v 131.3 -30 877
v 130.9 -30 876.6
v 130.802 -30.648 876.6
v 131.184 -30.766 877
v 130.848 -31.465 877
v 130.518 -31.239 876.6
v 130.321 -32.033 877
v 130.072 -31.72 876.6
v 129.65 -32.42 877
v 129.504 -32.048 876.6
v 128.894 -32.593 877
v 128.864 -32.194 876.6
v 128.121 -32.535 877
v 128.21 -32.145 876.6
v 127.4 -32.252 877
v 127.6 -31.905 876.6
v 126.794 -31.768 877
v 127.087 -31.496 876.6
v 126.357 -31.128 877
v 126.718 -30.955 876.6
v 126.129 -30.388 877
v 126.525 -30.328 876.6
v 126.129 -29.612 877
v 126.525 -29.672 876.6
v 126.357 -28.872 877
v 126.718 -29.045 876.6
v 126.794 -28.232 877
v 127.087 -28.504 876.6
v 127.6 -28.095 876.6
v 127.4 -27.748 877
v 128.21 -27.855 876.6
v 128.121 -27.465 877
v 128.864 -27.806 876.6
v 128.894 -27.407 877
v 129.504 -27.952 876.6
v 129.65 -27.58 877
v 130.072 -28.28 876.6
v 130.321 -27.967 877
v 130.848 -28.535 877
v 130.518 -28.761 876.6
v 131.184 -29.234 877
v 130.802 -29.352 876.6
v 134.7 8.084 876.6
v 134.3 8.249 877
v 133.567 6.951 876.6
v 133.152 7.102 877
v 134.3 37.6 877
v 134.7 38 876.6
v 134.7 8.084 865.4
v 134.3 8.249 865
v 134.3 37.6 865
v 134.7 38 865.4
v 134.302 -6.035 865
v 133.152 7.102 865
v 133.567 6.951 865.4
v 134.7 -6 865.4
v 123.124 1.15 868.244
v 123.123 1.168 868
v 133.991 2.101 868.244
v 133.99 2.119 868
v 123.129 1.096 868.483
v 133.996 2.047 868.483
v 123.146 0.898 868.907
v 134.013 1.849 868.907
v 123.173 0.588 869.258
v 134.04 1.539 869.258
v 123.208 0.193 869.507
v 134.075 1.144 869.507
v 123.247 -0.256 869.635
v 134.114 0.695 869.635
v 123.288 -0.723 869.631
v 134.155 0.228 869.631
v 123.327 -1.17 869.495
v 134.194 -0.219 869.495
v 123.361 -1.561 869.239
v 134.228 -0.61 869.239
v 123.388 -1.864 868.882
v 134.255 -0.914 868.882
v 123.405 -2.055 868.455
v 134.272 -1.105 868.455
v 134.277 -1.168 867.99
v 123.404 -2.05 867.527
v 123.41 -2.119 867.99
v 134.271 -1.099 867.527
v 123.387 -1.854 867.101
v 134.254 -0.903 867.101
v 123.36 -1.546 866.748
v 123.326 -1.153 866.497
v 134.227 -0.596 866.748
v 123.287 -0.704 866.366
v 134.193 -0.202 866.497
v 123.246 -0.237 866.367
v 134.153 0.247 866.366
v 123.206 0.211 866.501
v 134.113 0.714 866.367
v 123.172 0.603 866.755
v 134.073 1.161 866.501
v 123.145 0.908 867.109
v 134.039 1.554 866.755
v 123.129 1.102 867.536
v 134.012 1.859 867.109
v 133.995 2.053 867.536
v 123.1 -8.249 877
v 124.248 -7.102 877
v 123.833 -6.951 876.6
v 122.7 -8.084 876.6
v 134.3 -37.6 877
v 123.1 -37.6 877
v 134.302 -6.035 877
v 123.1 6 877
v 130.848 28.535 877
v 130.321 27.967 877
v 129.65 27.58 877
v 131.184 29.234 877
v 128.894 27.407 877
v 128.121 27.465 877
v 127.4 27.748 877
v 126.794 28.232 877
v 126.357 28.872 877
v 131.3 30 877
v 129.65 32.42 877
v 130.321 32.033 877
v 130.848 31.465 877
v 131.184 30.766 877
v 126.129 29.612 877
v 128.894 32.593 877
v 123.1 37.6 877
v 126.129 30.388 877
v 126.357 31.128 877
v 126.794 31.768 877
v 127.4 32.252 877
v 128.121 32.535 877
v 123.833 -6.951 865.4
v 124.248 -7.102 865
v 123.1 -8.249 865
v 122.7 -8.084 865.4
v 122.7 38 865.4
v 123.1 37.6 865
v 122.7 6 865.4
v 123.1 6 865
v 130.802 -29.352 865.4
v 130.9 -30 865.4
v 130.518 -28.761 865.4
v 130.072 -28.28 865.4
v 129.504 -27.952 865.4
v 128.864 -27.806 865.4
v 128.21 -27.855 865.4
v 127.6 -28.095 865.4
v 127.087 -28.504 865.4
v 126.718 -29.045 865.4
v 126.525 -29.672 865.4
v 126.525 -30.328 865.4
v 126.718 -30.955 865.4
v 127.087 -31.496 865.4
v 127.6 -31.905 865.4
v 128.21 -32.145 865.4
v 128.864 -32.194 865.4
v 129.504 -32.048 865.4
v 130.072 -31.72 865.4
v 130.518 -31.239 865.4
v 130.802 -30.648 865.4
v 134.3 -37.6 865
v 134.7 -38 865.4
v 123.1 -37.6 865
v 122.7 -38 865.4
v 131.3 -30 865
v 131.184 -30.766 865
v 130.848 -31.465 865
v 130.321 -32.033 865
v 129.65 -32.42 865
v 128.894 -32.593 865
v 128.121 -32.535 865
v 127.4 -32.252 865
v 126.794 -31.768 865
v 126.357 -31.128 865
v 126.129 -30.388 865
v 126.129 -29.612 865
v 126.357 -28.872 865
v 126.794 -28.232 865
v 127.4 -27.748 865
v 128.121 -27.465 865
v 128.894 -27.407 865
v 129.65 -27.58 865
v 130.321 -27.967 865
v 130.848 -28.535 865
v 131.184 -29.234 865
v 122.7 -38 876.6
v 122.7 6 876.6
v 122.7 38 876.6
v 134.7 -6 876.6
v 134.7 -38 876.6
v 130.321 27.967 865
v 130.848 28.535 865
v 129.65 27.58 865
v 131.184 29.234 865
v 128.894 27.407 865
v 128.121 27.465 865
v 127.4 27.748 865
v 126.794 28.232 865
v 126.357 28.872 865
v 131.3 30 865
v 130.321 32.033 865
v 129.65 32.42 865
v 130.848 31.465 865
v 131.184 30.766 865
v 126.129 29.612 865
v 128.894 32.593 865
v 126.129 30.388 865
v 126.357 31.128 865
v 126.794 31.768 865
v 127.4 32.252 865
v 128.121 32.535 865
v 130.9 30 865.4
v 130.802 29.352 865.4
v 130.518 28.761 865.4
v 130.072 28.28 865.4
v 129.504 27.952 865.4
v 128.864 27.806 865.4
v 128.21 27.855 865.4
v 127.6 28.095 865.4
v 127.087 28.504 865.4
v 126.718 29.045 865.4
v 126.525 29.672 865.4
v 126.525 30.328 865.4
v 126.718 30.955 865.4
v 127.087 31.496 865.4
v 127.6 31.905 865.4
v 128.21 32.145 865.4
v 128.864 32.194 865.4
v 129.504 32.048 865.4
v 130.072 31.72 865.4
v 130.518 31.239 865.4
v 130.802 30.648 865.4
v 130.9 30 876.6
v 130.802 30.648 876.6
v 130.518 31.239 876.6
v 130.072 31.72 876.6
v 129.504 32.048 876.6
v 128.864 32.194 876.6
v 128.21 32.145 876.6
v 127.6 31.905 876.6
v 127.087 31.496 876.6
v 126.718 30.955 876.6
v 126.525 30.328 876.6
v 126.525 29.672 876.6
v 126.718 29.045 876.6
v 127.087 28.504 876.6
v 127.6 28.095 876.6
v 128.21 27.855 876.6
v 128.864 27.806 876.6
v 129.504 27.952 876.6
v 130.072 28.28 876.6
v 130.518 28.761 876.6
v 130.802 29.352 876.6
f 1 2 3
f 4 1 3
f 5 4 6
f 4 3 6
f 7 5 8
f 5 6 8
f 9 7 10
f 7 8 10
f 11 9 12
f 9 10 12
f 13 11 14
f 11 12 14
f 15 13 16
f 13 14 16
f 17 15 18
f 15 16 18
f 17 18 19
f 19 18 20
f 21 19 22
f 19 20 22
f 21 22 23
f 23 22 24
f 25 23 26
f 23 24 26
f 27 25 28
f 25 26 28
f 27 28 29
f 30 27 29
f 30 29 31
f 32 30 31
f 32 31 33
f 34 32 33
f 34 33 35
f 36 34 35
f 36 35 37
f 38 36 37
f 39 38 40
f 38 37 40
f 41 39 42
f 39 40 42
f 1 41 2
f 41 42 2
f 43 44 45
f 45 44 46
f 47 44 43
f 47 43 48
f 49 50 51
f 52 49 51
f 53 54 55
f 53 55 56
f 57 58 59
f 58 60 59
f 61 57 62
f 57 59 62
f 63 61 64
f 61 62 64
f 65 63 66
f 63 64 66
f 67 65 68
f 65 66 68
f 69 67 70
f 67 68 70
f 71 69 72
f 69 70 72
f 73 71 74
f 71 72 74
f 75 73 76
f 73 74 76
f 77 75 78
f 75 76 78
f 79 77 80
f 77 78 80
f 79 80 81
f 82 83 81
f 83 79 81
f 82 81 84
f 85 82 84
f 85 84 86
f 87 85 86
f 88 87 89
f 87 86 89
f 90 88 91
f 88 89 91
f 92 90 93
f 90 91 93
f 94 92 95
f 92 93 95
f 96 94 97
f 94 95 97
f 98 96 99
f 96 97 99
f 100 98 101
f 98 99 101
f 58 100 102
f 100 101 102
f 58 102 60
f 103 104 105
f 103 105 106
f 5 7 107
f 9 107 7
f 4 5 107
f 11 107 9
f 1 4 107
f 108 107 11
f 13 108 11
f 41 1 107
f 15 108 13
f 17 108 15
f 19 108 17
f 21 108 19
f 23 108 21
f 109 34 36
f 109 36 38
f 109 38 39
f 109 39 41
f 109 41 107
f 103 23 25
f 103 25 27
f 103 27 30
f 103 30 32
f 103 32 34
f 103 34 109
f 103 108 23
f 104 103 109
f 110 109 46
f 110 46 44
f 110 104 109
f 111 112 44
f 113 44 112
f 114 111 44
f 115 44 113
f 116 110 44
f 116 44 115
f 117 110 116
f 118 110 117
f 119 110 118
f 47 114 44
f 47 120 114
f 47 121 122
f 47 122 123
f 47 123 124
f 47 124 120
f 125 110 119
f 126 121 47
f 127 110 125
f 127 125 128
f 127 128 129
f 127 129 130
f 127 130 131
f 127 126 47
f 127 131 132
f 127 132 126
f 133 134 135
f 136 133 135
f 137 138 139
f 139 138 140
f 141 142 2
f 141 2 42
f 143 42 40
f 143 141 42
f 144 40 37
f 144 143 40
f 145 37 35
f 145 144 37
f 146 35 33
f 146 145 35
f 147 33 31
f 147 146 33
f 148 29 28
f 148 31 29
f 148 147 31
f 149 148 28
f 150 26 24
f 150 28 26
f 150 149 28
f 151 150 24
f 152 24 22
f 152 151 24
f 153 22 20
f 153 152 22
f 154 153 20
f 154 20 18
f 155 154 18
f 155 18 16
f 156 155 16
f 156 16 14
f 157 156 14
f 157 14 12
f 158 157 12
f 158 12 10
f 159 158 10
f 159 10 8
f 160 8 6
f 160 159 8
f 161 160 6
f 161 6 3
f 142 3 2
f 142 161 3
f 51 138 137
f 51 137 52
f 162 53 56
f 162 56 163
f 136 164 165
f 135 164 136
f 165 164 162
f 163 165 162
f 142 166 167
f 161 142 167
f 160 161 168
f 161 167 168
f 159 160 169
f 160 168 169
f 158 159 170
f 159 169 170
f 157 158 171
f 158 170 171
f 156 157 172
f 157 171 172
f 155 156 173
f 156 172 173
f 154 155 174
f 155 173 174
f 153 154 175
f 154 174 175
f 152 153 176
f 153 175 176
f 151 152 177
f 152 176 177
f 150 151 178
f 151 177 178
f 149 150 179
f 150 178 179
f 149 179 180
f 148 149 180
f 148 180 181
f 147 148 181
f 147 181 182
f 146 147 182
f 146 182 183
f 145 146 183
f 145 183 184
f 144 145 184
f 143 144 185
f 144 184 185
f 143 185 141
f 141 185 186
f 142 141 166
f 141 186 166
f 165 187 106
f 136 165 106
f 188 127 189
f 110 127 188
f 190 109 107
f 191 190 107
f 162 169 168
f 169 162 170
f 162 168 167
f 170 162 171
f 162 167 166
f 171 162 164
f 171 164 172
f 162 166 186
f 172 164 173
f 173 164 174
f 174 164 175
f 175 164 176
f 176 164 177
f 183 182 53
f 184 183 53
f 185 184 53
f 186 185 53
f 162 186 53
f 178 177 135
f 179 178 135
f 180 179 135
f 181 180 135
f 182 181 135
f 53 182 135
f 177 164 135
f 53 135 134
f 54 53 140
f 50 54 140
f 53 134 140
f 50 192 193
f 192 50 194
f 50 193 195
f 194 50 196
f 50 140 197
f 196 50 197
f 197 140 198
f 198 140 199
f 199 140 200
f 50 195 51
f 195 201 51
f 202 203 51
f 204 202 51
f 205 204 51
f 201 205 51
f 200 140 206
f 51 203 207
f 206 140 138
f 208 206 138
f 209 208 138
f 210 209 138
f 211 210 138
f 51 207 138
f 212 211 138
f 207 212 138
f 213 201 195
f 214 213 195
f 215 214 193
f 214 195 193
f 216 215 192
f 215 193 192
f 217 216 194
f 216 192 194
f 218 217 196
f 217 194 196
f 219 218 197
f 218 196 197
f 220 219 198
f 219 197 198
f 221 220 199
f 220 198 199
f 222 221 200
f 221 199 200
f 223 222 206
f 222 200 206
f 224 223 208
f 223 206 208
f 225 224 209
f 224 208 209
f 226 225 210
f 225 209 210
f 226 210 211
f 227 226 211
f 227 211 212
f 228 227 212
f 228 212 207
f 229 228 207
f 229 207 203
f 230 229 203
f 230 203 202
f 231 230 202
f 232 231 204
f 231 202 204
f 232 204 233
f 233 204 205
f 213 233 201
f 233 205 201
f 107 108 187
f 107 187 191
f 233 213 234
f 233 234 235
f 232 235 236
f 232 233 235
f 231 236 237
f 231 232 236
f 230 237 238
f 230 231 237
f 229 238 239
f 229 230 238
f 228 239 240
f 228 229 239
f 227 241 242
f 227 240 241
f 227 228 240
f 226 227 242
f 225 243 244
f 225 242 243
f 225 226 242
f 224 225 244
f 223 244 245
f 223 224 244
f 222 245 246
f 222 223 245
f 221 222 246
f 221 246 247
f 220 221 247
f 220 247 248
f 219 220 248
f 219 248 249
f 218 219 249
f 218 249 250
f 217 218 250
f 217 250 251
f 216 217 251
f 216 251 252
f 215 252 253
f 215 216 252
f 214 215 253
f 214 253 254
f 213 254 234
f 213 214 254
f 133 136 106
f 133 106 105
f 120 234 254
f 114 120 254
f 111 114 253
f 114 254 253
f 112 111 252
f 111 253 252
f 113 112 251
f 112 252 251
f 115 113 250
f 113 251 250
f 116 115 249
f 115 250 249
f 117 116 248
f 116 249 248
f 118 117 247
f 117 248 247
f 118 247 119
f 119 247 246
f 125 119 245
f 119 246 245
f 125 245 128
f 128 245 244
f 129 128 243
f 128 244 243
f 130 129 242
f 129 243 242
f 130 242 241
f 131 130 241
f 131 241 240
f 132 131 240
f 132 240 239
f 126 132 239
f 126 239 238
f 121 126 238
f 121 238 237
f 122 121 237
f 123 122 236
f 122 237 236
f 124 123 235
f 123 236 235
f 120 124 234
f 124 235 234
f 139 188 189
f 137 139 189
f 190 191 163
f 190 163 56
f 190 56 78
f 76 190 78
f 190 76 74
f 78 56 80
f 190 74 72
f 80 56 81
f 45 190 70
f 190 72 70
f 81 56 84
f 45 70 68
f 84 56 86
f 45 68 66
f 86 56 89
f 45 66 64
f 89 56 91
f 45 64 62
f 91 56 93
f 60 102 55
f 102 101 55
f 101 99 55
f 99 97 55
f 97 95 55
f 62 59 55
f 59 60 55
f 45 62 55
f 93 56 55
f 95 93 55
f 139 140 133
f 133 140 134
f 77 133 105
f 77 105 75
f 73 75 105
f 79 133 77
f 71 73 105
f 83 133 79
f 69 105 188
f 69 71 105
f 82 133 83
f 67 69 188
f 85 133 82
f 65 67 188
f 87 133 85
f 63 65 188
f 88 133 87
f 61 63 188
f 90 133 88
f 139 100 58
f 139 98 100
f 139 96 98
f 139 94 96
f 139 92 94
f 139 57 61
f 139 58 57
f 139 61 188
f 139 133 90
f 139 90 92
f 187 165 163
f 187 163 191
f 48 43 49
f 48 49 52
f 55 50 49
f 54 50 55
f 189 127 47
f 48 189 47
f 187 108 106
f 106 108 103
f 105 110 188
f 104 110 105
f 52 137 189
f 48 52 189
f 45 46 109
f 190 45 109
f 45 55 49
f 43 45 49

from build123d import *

# Parameters (mm, degrees)
SKETCH023_W          = 76
SKETCH023_H          = 12
PAD007_DEPTH         = 12
SKETCH065_R          = 2.2
POCKET021_DEPTH      = 0.001
POCKET021_DEPTH_BACK = 42.001
SKETCH025_R          = 1.65
POCKET022_DEPTH      = 9.290086
POCKET022_DEPTH_BACK = 9.290086
CHAMFER004_SIZE      = 0.4


with BuildPart() as part:
    # Sketch023 → Pad007 (new body)
    with BuildSketch(Plane.YZ):
        with Locations((0, 36)):
            Rectangle(SKETCH023_W, SKETCH023_H)
    extrude(amount=PAD007_DEPTH)

    # Sketch065 → Pocket021 (cut, two sides)
    with BuildSketch(Plane.XY) as pocket021_sk:
        with Locations((6, 30)):
            Circle(SKETCH065_R)
        with Locations((6, -30)):
            Circle(SKETCH065_R)
        Polygon((10.866975, 6.950634), (13, 9.083659), (13, -5.999897), (12, -5.999897), align=None)
        Polygon((0, 5.999897), (-1, 5.999897), (-1, -9.083659), (1.133025, -6.950634), align=None)
    extrude(amount=-POCKET021_DEPTH, mode=Mode.SUBTRACT)
    extrude(pocket021_sk.sketch, amount=POCKET021_DEPTH_BACK, mode=Mode.SUBTRACT)

    # Sketch025 (on DatumPlane) → Pocket022 (cut, two sides)
    with BuildSketch(Plane(origin=(6, 0, 0), x_dir=(-0.087156, 0.996195, 0), z_dir=(0.996195, 0.087156, 0))) as pocket022_sk:
        with Locations((0, 33)):
            Circle(SKETCH025_R)
    extrude(amount=-POCKET022_DEPTH, mode=Mode.SUBTRACT)
    extrude(pocket022_sk.sketch, amount=POCKET022_DEPTH_BACK, mode=Mode.SUBTRACT)

    # Chamfer004
    chamfer004_edges = [part.edges().sort_by_distance(p)[0] for p in [
        (0, -23.041829, 42),
        (0.566512, -7.517146, 42),
        (0.566512, -0.475369, 42),
        (0, 21.999948, 42),
        (6, 38, 42),
        (12, 23.041829, 42),
        (11.433488, 7.517146, 42),
        (11.433488, 0.475369, 42),
        (12, -21.999948, 42),
        (6, -38, 42),
        (3.8, -30, 42),
        (3.8, 30, 42),
        (0, -23.041829, 30),
        (0.566512, -7.517146, 30),
        (0.566512, -0.475369, 30),
        (0, 21.999948, 30),
        (6, 38, 30),
        (12, 23.041829, 30),
        (11.433488, 7.517146, 30),
        (11.433488, 0.475369, 30),
        (12, -21.999948, 30),
        (6, -38, 30),
        (3.8, -30, 30),
        (3.8, 30, 30),
    ]]
    chamfer(chamfer004_edges, length=CHAMFER004_SIZE)


with BuildPart() as part_1:
    # Body008 placement: moved
    add(part.part.moved(Location((122.7, 0, 835))))


solid = part_1.part
